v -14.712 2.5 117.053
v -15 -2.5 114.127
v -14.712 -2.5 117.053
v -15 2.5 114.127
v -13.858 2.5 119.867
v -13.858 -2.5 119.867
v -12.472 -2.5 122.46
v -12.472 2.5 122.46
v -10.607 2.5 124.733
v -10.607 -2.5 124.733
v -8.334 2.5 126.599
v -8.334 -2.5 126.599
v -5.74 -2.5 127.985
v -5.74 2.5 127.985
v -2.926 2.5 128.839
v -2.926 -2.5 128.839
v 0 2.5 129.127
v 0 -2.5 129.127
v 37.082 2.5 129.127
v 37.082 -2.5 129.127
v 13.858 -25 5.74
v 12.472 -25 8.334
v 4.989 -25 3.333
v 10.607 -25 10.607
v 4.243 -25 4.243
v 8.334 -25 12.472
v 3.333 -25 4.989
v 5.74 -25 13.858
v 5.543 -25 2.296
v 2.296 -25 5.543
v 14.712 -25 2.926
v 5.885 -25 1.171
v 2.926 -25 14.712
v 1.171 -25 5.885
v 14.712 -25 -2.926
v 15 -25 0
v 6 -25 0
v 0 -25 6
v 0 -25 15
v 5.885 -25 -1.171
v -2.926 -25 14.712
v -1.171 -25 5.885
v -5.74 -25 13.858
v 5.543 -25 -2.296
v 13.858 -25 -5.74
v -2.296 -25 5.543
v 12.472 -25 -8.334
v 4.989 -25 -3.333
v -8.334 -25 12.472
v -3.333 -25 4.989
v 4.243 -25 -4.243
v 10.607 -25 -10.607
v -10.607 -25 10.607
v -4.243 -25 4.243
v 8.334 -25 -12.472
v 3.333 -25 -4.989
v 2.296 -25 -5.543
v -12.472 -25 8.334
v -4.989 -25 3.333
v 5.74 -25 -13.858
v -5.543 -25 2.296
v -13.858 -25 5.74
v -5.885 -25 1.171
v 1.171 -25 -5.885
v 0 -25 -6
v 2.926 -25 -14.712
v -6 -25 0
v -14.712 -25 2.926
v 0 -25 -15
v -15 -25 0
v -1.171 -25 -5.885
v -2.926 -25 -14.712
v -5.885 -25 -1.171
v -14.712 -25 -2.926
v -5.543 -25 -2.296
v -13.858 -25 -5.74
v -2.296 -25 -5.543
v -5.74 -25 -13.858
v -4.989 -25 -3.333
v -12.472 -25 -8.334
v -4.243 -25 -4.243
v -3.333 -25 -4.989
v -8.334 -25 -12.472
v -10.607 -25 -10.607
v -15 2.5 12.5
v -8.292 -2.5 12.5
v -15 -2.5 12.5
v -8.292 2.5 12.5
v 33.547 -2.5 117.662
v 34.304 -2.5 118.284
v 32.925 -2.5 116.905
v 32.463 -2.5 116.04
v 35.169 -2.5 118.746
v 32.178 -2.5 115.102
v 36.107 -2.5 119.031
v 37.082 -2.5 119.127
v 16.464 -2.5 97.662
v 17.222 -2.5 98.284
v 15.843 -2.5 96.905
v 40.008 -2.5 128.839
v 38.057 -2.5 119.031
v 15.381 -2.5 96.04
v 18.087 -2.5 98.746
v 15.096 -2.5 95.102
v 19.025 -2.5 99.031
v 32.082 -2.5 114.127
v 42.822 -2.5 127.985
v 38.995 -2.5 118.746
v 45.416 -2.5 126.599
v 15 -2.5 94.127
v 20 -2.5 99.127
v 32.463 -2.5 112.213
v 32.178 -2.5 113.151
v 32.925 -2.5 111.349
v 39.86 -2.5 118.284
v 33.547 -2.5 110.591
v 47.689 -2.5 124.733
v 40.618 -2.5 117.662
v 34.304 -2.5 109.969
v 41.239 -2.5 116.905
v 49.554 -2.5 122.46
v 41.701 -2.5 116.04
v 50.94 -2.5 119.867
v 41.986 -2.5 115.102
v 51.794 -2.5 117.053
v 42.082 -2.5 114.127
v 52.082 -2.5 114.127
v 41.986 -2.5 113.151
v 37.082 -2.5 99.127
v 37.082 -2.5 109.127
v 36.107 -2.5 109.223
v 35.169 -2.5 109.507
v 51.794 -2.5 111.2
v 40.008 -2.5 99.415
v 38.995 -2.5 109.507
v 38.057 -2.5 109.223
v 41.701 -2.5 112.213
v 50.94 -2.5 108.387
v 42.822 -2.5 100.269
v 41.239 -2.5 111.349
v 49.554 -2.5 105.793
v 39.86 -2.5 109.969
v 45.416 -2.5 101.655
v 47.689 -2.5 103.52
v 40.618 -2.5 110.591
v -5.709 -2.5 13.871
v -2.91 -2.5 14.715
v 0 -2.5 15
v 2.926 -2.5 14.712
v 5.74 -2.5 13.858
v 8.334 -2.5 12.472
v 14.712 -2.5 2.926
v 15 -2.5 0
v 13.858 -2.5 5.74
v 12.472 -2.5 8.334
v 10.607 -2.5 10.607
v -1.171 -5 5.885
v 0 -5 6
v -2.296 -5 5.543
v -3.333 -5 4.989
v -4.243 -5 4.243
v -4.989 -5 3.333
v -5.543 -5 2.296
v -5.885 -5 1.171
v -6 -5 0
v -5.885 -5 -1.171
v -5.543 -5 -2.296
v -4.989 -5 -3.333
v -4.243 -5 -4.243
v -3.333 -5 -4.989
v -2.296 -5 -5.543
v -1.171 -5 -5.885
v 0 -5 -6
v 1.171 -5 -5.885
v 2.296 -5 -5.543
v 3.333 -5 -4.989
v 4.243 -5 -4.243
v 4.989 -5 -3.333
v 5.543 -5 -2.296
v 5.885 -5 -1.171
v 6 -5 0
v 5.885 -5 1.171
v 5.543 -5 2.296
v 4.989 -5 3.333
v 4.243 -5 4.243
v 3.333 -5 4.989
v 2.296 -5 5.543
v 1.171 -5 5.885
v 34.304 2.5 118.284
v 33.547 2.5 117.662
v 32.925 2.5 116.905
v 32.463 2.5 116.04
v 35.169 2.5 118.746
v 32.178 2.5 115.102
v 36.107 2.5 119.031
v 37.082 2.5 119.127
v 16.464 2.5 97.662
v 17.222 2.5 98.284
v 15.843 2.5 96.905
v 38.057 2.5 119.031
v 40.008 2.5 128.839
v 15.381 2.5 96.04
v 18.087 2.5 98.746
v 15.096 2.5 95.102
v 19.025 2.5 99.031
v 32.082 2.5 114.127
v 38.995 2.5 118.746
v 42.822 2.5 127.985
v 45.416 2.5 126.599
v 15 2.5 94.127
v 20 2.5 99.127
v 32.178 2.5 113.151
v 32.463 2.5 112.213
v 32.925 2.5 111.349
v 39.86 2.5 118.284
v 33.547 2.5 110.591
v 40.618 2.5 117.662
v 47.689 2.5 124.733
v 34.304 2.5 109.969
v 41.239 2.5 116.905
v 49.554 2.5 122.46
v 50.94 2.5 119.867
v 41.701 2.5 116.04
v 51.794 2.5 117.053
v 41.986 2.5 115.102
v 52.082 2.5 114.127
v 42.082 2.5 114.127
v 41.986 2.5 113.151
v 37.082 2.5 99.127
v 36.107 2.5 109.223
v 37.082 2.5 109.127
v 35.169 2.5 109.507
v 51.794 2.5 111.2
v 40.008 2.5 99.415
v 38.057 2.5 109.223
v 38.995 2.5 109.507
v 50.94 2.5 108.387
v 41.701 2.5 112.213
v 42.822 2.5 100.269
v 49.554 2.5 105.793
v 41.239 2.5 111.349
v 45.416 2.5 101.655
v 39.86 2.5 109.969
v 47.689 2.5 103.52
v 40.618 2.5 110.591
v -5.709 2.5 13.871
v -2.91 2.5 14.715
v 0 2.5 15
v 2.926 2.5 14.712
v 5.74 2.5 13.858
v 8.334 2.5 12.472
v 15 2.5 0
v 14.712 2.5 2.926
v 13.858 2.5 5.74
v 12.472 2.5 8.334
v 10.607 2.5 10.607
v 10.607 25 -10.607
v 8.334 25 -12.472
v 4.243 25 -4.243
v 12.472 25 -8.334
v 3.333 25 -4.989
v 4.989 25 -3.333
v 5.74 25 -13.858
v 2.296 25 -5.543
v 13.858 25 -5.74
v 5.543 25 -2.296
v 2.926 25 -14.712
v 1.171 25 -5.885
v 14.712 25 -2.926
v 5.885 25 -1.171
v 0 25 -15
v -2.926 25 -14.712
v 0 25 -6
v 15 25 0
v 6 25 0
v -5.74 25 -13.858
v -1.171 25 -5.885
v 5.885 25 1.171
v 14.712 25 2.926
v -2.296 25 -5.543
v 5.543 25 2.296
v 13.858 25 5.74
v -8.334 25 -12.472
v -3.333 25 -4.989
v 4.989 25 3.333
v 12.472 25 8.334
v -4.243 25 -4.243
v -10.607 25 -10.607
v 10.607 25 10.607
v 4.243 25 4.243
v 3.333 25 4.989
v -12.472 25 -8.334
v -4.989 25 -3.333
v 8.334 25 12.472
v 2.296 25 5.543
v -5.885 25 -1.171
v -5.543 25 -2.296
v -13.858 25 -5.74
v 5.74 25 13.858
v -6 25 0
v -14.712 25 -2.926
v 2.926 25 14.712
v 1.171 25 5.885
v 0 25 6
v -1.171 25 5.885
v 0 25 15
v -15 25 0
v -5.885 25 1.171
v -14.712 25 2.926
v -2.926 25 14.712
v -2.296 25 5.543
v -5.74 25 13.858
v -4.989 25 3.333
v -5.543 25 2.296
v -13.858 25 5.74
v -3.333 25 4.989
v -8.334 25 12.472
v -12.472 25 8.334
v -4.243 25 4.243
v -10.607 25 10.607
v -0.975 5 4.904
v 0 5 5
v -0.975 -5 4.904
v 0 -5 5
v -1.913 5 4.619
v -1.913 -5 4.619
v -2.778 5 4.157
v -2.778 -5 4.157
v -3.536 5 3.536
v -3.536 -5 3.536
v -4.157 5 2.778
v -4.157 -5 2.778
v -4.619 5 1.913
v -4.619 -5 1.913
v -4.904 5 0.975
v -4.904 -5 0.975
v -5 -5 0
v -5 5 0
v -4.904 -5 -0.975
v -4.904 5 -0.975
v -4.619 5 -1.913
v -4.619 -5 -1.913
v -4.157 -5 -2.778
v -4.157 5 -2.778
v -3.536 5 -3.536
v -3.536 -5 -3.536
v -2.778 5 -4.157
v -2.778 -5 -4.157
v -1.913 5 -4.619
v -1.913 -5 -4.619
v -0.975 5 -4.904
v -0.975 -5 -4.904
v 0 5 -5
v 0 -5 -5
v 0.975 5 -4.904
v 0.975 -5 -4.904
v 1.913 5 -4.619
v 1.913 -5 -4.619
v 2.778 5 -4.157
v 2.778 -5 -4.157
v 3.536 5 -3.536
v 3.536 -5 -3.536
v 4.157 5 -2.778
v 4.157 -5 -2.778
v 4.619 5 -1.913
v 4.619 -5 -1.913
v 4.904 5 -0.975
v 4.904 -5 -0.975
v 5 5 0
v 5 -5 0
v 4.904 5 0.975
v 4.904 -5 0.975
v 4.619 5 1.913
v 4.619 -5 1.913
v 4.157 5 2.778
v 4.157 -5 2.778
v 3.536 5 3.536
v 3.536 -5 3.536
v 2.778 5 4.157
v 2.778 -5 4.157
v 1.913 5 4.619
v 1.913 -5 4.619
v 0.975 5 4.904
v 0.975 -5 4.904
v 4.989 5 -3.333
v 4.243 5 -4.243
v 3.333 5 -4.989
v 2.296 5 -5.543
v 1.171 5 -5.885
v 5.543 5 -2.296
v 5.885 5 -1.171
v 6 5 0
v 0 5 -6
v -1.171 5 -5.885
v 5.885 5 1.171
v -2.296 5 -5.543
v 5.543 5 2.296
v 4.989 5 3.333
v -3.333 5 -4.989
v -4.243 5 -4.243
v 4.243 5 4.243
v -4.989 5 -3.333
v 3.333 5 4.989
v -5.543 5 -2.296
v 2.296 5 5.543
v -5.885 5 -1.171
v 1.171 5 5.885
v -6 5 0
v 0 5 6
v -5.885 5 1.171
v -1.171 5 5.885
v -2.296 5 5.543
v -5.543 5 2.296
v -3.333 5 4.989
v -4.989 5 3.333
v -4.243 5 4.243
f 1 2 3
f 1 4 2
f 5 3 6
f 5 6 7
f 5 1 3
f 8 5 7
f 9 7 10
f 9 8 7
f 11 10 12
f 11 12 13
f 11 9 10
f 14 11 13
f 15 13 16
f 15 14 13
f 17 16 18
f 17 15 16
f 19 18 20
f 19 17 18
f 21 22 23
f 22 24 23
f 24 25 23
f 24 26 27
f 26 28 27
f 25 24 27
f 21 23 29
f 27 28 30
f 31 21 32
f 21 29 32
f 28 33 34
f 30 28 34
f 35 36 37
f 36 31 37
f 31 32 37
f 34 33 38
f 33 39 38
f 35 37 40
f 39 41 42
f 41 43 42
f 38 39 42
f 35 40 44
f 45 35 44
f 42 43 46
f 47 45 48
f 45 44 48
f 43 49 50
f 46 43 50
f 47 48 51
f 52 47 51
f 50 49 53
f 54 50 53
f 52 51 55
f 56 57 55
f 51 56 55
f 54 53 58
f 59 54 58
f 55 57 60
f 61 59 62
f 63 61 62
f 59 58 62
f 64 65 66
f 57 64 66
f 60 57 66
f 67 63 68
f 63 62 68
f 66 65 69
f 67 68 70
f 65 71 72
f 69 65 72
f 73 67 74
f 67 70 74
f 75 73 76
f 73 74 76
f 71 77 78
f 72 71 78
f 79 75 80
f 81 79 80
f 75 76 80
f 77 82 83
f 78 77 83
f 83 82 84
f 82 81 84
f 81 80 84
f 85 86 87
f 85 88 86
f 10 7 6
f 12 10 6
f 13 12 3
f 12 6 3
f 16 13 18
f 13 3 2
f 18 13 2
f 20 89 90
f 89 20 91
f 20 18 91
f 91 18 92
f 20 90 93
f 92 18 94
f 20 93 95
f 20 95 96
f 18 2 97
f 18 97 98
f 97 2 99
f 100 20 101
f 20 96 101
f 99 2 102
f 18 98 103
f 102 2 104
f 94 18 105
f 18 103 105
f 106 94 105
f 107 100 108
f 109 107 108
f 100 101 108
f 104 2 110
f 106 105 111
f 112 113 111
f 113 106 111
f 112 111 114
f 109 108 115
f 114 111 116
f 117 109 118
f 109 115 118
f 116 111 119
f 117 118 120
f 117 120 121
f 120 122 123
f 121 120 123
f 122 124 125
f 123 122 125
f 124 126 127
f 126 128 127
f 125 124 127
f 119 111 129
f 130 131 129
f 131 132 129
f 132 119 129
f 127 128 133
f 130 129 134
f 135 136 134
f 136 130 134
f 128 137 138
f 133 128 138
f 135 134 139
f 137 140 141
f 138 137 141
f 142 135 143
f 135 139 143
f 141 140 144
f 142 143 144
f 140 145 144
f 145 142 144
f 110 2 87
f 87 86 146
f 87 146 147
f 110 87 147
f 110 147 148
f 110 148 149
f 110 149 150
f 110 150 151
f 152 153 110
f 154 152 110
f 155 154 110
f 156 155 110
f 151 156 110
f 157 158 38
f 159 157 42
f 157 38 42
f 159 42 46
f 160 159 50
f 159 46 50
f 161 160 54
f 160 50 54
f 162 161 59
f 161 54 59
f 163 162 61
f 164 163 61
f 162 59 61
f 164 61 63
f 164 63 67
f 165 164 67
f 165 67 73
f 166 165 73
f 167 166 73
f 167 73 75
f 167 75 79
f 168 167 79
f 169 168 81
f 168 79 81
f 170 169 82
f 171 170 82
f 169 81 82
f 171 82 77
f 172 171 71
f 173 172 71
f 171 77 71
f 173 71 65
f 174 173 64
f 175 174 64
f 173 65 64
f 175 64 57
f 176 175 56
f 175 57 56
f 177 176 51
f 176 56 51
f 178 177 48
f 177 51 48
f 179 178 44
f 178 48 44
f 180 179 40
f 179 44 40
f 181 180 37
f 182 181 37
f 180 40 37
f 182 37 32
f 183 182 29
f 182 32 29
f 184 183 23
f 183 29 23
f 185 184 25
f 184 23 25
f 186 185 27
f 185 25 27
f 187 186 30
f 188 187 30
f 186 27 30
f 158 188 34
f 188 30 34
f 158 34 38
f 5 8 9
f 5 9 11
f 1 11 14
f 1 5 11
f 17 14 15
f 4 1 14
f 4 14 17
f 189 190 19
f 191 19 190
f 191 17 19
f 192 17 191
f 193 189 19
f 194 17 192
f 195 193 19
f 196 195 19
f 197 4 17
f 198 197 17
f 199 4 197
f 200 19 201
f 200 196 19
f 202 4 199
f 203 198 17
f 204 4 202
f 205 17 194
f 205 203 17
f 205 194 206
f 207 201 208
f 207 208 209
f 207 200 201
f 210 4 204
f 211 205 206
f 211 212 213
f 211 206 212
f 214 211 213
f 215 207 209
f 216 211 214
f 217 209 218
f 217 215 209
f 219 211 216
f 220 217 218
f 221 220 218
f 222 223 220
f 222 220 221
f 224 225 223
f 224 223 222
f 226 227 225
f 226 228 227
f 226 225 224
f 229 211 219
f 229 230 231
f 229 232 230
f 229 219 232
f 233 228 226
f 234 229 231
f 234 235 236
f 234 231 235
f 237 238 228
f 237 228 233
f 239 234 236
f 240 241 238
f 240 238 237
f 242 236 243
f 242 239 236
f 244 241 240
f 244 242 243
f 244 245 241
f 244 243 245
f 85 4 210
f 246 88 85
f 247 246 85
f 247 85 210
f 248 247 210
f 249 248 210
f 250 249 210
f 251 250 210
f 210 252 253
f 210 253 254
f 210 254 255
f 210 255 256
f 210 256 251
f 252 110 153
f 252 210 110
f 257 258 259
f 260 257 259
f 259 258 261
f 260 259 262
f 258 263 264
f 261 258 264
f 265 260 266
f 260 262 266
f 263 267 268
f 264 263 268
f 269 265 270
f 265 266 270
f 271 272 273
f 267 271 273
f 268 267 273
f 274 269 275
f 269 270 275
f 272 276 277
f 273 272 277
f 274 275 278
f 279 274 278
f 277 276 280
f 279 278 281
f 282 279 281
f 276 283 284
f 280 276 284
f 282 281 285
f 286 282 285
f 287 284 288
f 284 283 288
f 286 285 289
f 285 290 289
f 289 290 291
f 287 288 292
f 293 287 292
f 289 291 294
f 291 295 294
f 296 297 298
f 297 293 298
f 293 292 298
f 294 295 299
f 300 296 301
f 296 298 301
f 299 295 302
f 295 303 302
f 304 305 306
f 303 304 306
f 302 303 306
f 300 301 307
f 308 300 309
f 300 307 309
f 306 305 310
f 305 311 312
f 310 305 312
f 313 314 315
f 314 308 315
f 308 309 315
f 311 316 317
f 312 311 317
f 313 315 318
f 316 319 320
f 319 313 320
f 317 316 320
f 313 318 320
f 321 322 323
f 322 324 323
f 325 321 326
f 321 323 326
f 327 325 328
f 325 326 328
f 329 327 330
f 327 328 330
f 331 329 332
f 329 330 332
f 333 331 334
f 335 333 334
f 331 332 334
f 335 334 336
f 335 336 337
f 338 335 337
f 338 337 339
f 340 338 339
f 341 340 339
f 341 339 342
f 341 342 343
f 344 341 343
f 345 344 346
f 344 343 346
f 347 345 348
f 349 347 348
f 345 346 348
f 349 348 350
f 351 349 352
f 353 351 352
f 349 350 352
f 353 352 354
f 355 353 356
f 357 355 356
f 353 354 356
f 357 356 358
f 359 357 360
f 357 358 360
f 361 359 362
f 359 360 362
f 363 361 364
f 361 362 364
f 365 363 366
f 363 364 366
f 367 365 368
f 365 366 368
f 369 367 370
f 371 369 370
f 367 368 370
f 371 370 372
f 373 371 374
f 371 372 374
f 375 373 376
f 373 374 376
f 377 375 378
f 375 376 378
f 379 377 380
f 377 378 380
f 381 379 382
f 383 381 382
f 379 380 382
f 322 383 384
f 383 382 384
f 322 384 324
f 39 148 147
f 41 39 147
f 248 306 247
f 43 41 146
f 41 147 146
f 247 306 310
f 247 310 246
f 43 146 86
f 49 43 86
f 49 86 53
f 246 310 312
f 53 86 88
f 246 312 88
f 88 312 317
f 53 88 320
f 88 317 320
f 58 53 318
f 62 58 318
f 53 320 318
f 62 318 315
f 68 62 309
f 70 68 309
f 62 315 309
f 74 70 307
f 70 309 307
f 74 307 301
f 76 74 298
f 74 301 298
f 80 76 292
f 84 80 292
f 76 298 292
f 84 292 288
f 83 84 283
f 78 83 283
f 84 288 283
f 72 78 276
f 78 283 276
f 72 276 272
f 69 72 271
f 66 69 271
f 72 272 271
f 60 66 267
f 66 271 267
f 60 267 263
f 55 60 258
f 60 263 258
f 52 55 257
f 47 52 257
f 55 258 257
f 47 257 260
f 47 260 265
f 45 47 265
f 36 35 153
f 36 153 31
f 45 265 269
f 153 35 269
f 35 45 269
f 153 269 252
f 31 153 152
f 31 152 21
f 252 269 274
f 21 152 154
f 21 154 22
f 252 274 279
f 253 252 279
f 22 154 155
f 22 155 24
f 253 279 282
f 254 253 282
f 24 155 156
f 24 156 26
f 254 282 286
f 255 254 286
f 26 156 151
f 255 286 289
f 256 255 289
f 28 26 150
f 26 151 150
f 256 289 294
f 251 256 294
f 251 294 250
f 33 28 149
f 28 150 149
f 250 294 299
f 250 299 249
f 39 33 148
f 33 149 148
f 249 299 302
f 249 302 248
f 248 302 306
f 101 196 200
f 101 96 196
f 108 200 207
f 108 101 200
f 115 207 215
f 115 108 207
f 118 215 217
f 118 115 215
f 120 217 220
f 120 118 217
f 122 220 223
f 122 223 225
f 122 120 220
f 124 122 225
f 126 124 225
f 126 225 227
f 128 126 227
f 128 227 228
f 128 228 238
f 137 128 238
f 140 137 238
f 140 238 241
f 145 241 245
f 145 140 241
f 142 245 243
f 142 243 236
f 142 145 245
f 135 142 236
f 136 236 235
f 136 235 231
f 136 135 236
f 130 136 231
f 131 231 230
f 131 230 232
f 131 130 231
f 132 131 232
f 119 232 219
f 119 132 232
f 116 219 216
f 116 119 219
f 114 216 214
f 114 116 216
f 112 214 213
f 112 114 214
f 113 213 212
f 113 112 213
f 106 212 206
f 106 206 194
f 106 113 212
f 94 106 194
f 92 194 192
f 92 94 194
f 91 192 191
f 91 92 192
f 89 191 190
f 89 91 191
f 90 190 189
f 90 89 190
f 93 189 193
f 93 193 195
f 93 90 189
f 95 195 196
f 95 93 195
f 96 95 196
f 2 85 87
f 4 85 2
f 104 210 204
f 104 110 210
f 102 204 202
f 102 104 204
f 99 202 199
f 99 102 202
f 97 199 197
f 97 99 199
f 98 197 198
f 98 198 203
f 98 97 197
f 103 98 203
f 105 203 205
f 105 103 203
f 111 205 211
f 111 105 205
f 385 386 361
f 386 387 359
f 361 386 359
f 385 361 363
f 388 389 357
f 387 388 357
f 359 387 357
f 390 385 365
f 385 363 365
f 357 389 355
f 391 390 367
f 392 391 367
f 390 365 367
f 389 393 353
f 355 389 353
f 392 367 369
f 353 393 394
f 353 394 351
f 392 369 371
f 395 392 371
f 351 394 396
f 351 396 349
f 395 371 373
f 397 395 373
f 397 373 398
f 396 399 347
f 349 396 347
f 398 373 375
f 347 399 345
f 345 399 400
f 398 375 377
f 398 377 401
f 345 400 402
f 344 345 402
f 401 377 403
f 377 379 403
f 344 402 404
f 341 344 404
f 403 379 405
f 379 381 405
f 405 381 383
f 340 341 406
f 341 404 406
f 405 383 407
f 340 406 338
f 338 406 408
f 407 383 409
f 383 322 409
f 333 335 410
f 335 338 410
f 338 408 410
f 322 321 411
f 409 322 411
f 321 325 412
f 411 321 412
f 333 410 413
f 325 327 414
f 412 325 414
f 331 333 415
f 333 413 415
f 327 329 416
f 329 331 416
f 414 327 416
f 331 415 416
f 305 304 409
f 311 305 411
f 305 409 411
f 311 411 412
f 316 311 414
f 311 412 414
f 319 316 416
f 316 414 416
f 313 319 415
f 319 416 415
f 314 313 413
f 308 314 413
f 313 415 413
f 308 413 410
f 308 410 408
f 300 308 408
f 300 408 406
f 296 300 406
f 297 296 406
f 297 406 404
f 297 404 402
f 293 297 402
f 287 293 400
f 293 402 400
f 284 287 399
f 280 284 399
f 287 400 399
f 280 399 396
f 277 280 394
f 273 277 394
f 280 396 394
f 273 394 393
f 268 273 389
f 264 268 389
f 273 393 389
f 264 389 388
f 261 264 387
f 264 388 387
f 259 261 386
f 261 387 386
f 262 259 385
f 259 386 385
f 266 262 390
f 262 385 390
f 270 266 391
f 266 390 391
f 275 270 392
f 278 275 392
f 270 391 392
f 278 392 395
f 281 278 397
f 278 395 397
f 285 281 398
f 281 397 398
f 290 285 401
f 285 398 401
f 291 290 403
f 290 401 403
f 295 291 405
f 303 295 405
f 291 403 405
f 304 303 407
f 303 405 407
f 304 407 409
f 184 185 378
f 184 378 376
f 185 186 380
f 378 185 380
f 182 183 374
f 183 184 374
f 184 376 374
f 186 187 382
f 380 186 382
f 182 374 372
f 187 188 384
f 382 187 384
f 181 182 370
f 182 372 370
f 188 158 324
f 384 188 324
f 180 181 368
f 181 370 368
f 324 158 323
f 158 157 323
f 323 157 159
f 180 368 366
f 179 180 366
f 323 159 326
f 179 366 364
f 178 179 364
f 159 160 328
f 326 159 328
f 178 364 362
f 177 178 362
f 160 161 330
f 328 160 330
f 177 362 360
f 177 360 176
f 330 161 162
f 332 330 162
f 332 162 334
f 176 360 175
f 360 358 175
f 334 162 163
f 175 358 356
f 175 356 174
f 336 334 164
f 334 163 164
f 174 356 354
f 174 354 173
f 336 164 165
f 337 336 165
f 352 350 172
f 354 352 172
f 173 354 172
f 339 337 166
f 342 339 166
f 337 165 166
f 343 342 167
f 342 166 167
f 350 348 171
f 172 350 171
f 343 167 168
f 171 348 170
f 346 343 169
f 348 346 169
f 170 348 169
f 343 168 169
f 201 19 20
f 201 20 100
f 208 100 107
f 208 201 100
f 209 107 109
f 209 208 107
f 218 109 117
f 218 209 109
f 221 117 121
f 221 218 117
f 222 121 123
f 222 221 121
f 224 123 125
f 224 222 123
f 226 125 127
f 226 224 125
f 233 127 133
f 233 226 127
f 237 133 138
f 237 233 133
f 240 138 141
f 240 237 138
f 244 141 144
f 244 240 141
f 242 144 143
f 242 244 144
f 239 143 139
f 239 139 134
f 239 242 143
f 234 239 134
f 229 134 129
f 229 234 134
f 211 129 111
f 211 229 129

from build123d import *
from OCP.BRepFilletAPI import BRepFilletAPI_MakeFillet

# Parameters (mm, degrees)
SKETCH7_R           = 5
BOSS_EXTRUDE2_DEPTH = 2.5
FILLET2_R1          = 5
FILLET2_R2          = 15


with BuildPart() as part:
    # Sketch4 → Revolve1 (revolve)
    with BuildSketch(Plane.XY):
        Polygon((5, 5), (5, -5), (6, -5), (6, -25), (15, -25), (15, 25), (6, 25), (6, 5), align=None)
    revolve(axis=Axis((0, 25, 0), (0, -1, 0)))

    # Sketch7 → Boss-Extrude2 (add, symmetric)
    with BuildSketch(Plane(origin=(0, 0, 0), x_dir=(1, 0, 0), z_dir=(0, 1, 0))):
        with BuildLine():
            Line((-15, -12.5), (-15, -129.126781955))
            Line((-15, -129.126781955), (37.082039325, -129.126781955))
            ThreePointArc((37.082039325, -129.126781955), (52.082039325, -114.126781955), (37.082039325, -99.126781955))
            Line((37.082039325, -99.126781955), (15, -99.126781955))
            Line((15, -99.126781955), (15, 0))
            ThreePointArc((15, 0), (7.093185827, -13.216910184), (-8.291561976, -12.5))
            Line((-8.291561976, -12.5), (-15, -12.5))
        make_face()
        with Locations((37.082039325, -114.126781955)):
            Circle(SKETCH7_R, mode=Mode.SUBTRACT)
    extrude(amount=BOSS_EXTRUDE2_DEPTH, both=True)

    # Fillet2: one fillet with a radius per group of edges: ONE call of the kernel's fillet builder (fillet() takes one radius for all edges)
    fillet2_edges_1 = [part.edges().sort_by_distance(p)[0] for p in [
        (15, 0, 99.126781955),
    ]]
    fillet2_edges_2 = [part.edges().sort_by_distance(p)[0] for p in [
        (-15, 0, 129.126781955),
    ]]
    fillet2 = BRepFilletAPI_MakeFillet(part.part.solid().wrapped)
    for e in fillet2_edges_1:
        fillet2.Add(FILLET2_R1, e.wrapped)
    for e in fillet2_edges_2:
        fillet2.Add(FILLET2_R2, e.wrapped)
    add(Compound.cast(fillet2.Shape()), mode=Mode.REPLACE)


solid = part.part
